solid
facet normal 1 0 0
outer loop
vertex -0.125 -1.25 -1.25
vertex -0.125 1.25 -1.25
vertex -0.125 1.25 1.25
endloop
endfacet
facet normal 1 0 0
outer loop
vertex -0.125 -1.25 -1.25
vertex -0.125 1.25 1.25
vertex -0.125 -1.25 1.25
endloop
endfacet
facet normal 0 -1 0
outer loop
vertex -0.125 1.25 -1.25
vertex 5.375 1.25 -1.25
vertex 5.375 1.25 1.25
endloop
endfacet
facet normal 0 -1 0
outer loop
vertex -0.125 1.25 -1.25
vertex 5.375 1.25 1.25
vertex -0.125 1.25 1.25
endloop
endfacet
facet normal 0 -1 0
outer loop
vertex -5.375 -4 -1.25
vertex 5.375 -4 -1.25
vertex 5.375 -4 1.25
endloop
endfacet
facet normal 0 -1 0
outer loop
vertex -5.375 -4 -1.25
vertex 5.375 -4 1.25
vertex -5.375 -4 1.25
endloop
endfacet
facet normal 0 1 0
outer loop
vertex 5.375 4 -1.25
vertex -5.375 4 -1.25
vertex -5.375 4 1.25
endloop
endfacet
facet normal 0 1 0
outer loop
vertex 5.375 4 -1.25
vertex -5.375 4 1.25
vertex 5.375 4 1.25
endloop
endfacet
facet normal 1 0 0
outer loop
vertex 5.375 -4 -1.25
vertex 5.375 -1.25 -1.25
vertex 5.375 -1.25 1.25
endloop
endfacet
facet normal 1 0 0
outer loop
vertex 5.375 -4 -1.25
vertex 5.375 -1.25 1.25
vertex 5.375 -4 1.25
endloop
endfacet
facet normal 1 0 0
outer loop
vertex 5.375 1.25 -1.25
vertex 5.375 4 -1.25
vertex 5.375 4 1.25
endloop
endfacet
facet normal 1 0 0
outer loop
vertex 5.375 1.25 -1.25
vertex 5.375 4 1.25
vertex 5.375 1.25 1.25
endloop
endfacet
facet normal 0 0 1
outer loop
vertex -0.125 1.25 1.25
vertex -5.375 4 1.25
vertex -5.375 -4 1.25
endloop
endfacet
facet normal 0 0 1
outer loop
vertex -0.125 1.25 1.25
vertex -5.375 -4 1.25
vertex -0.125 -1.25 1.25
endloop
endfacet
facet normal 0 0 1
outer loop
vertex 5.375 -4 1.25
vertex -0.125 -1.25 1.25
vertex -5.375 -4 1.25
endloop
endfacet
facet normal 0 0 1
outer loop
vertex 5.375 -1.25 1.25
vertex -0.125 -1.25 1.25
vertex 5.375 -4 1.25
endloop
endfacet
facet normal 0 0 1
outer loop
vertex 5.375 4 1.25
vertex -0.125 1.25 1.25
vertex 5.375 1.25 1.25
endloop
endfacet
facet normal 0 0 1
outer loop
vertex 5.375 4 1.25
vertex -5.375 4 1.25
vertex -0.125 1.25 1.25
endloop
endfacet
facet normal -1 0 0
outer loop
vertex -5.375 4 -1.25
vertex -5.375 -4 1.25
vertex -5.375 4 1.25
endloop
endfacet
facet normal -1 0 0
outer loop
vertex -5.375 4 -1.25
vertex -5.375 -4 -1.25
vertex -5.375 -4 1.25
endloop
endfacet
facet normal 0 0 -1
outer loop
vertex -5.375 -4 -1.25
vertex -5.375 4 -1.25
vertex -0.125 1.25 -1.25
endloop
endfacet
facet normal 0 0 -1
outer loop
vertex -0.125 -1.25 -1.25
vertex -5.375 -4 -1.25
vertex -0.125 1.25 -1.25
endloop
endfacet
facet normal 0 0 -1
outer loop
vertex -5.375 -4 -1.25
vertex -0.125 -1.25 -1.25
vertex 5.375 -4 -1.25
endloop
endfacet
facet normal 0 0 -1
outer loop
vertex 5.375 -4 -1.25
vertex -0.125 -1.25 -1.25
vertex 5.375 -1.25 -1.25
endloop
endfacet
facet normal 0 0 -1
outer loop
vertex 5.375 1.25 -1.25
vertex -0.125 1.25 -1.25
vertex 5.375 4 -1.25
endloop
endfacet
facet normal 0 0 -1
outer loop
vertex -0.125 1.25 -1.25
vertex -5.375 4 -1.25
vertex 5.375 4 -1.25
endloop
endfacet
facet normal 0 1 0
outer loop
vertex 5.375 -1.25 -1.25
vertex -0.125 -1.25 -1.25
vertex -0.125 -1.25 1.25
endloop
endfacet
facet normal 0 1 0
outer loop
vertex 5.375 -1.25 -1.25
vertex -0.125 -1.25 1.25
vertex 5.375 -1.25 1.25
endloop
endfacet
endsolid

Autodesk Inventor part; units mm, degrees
ref_plane "YZ Plane" through (0, 0, 0) normal (1, 0, 0) x (0, 1, 0)
ref_plane "XZ Plane" through (0, 0, 0) normal (0, 1, 0) x (-1, 0, 0)
ref_plane "XY Plane" through (0, 0, 0) normal (0, 0, 1) x (1, 0, 0)
sketch "Sketch1" plane through (0, 0, 0) normal (0, 0, 1) x (1, 0, 0)
  line L0 (5.375, 4) -> (5.375, 1.25)
  line L1 (5.375, 1.25) -> (-0.125, 1.25)
  line L2 (-0.125, 1.25) -> (-0.125, -1.25)
  line L3 (-0.125, -1.25) -> (5.375, -1.25)
  line L4 (5.375, -1.25) -> (5.375, -4)
  line L5 (5.375, -4) -> (-5.375, -4)
  line L6 (-5.375, -4) -> (-5.375, 4)
  line L7 (-5.375, 4) -> (5.375, 4)
  line L8 (-12.6672, 0) -> (12.6672, 0) construction
  line L9 (0, 8.1446) -> (0, -8.1446) construction
  point P0 (0, 0)
  point P1 (0, 0)
  dimension "d1" = 8
  dimension "d2" = 10.75
  dimension "d4" = 2.5
  dimension "d7" = 0.125
extrude "Extrusion1" add sketch "Sketch1" along normal mid plane 2.5
properties part number "pitahaya5"
